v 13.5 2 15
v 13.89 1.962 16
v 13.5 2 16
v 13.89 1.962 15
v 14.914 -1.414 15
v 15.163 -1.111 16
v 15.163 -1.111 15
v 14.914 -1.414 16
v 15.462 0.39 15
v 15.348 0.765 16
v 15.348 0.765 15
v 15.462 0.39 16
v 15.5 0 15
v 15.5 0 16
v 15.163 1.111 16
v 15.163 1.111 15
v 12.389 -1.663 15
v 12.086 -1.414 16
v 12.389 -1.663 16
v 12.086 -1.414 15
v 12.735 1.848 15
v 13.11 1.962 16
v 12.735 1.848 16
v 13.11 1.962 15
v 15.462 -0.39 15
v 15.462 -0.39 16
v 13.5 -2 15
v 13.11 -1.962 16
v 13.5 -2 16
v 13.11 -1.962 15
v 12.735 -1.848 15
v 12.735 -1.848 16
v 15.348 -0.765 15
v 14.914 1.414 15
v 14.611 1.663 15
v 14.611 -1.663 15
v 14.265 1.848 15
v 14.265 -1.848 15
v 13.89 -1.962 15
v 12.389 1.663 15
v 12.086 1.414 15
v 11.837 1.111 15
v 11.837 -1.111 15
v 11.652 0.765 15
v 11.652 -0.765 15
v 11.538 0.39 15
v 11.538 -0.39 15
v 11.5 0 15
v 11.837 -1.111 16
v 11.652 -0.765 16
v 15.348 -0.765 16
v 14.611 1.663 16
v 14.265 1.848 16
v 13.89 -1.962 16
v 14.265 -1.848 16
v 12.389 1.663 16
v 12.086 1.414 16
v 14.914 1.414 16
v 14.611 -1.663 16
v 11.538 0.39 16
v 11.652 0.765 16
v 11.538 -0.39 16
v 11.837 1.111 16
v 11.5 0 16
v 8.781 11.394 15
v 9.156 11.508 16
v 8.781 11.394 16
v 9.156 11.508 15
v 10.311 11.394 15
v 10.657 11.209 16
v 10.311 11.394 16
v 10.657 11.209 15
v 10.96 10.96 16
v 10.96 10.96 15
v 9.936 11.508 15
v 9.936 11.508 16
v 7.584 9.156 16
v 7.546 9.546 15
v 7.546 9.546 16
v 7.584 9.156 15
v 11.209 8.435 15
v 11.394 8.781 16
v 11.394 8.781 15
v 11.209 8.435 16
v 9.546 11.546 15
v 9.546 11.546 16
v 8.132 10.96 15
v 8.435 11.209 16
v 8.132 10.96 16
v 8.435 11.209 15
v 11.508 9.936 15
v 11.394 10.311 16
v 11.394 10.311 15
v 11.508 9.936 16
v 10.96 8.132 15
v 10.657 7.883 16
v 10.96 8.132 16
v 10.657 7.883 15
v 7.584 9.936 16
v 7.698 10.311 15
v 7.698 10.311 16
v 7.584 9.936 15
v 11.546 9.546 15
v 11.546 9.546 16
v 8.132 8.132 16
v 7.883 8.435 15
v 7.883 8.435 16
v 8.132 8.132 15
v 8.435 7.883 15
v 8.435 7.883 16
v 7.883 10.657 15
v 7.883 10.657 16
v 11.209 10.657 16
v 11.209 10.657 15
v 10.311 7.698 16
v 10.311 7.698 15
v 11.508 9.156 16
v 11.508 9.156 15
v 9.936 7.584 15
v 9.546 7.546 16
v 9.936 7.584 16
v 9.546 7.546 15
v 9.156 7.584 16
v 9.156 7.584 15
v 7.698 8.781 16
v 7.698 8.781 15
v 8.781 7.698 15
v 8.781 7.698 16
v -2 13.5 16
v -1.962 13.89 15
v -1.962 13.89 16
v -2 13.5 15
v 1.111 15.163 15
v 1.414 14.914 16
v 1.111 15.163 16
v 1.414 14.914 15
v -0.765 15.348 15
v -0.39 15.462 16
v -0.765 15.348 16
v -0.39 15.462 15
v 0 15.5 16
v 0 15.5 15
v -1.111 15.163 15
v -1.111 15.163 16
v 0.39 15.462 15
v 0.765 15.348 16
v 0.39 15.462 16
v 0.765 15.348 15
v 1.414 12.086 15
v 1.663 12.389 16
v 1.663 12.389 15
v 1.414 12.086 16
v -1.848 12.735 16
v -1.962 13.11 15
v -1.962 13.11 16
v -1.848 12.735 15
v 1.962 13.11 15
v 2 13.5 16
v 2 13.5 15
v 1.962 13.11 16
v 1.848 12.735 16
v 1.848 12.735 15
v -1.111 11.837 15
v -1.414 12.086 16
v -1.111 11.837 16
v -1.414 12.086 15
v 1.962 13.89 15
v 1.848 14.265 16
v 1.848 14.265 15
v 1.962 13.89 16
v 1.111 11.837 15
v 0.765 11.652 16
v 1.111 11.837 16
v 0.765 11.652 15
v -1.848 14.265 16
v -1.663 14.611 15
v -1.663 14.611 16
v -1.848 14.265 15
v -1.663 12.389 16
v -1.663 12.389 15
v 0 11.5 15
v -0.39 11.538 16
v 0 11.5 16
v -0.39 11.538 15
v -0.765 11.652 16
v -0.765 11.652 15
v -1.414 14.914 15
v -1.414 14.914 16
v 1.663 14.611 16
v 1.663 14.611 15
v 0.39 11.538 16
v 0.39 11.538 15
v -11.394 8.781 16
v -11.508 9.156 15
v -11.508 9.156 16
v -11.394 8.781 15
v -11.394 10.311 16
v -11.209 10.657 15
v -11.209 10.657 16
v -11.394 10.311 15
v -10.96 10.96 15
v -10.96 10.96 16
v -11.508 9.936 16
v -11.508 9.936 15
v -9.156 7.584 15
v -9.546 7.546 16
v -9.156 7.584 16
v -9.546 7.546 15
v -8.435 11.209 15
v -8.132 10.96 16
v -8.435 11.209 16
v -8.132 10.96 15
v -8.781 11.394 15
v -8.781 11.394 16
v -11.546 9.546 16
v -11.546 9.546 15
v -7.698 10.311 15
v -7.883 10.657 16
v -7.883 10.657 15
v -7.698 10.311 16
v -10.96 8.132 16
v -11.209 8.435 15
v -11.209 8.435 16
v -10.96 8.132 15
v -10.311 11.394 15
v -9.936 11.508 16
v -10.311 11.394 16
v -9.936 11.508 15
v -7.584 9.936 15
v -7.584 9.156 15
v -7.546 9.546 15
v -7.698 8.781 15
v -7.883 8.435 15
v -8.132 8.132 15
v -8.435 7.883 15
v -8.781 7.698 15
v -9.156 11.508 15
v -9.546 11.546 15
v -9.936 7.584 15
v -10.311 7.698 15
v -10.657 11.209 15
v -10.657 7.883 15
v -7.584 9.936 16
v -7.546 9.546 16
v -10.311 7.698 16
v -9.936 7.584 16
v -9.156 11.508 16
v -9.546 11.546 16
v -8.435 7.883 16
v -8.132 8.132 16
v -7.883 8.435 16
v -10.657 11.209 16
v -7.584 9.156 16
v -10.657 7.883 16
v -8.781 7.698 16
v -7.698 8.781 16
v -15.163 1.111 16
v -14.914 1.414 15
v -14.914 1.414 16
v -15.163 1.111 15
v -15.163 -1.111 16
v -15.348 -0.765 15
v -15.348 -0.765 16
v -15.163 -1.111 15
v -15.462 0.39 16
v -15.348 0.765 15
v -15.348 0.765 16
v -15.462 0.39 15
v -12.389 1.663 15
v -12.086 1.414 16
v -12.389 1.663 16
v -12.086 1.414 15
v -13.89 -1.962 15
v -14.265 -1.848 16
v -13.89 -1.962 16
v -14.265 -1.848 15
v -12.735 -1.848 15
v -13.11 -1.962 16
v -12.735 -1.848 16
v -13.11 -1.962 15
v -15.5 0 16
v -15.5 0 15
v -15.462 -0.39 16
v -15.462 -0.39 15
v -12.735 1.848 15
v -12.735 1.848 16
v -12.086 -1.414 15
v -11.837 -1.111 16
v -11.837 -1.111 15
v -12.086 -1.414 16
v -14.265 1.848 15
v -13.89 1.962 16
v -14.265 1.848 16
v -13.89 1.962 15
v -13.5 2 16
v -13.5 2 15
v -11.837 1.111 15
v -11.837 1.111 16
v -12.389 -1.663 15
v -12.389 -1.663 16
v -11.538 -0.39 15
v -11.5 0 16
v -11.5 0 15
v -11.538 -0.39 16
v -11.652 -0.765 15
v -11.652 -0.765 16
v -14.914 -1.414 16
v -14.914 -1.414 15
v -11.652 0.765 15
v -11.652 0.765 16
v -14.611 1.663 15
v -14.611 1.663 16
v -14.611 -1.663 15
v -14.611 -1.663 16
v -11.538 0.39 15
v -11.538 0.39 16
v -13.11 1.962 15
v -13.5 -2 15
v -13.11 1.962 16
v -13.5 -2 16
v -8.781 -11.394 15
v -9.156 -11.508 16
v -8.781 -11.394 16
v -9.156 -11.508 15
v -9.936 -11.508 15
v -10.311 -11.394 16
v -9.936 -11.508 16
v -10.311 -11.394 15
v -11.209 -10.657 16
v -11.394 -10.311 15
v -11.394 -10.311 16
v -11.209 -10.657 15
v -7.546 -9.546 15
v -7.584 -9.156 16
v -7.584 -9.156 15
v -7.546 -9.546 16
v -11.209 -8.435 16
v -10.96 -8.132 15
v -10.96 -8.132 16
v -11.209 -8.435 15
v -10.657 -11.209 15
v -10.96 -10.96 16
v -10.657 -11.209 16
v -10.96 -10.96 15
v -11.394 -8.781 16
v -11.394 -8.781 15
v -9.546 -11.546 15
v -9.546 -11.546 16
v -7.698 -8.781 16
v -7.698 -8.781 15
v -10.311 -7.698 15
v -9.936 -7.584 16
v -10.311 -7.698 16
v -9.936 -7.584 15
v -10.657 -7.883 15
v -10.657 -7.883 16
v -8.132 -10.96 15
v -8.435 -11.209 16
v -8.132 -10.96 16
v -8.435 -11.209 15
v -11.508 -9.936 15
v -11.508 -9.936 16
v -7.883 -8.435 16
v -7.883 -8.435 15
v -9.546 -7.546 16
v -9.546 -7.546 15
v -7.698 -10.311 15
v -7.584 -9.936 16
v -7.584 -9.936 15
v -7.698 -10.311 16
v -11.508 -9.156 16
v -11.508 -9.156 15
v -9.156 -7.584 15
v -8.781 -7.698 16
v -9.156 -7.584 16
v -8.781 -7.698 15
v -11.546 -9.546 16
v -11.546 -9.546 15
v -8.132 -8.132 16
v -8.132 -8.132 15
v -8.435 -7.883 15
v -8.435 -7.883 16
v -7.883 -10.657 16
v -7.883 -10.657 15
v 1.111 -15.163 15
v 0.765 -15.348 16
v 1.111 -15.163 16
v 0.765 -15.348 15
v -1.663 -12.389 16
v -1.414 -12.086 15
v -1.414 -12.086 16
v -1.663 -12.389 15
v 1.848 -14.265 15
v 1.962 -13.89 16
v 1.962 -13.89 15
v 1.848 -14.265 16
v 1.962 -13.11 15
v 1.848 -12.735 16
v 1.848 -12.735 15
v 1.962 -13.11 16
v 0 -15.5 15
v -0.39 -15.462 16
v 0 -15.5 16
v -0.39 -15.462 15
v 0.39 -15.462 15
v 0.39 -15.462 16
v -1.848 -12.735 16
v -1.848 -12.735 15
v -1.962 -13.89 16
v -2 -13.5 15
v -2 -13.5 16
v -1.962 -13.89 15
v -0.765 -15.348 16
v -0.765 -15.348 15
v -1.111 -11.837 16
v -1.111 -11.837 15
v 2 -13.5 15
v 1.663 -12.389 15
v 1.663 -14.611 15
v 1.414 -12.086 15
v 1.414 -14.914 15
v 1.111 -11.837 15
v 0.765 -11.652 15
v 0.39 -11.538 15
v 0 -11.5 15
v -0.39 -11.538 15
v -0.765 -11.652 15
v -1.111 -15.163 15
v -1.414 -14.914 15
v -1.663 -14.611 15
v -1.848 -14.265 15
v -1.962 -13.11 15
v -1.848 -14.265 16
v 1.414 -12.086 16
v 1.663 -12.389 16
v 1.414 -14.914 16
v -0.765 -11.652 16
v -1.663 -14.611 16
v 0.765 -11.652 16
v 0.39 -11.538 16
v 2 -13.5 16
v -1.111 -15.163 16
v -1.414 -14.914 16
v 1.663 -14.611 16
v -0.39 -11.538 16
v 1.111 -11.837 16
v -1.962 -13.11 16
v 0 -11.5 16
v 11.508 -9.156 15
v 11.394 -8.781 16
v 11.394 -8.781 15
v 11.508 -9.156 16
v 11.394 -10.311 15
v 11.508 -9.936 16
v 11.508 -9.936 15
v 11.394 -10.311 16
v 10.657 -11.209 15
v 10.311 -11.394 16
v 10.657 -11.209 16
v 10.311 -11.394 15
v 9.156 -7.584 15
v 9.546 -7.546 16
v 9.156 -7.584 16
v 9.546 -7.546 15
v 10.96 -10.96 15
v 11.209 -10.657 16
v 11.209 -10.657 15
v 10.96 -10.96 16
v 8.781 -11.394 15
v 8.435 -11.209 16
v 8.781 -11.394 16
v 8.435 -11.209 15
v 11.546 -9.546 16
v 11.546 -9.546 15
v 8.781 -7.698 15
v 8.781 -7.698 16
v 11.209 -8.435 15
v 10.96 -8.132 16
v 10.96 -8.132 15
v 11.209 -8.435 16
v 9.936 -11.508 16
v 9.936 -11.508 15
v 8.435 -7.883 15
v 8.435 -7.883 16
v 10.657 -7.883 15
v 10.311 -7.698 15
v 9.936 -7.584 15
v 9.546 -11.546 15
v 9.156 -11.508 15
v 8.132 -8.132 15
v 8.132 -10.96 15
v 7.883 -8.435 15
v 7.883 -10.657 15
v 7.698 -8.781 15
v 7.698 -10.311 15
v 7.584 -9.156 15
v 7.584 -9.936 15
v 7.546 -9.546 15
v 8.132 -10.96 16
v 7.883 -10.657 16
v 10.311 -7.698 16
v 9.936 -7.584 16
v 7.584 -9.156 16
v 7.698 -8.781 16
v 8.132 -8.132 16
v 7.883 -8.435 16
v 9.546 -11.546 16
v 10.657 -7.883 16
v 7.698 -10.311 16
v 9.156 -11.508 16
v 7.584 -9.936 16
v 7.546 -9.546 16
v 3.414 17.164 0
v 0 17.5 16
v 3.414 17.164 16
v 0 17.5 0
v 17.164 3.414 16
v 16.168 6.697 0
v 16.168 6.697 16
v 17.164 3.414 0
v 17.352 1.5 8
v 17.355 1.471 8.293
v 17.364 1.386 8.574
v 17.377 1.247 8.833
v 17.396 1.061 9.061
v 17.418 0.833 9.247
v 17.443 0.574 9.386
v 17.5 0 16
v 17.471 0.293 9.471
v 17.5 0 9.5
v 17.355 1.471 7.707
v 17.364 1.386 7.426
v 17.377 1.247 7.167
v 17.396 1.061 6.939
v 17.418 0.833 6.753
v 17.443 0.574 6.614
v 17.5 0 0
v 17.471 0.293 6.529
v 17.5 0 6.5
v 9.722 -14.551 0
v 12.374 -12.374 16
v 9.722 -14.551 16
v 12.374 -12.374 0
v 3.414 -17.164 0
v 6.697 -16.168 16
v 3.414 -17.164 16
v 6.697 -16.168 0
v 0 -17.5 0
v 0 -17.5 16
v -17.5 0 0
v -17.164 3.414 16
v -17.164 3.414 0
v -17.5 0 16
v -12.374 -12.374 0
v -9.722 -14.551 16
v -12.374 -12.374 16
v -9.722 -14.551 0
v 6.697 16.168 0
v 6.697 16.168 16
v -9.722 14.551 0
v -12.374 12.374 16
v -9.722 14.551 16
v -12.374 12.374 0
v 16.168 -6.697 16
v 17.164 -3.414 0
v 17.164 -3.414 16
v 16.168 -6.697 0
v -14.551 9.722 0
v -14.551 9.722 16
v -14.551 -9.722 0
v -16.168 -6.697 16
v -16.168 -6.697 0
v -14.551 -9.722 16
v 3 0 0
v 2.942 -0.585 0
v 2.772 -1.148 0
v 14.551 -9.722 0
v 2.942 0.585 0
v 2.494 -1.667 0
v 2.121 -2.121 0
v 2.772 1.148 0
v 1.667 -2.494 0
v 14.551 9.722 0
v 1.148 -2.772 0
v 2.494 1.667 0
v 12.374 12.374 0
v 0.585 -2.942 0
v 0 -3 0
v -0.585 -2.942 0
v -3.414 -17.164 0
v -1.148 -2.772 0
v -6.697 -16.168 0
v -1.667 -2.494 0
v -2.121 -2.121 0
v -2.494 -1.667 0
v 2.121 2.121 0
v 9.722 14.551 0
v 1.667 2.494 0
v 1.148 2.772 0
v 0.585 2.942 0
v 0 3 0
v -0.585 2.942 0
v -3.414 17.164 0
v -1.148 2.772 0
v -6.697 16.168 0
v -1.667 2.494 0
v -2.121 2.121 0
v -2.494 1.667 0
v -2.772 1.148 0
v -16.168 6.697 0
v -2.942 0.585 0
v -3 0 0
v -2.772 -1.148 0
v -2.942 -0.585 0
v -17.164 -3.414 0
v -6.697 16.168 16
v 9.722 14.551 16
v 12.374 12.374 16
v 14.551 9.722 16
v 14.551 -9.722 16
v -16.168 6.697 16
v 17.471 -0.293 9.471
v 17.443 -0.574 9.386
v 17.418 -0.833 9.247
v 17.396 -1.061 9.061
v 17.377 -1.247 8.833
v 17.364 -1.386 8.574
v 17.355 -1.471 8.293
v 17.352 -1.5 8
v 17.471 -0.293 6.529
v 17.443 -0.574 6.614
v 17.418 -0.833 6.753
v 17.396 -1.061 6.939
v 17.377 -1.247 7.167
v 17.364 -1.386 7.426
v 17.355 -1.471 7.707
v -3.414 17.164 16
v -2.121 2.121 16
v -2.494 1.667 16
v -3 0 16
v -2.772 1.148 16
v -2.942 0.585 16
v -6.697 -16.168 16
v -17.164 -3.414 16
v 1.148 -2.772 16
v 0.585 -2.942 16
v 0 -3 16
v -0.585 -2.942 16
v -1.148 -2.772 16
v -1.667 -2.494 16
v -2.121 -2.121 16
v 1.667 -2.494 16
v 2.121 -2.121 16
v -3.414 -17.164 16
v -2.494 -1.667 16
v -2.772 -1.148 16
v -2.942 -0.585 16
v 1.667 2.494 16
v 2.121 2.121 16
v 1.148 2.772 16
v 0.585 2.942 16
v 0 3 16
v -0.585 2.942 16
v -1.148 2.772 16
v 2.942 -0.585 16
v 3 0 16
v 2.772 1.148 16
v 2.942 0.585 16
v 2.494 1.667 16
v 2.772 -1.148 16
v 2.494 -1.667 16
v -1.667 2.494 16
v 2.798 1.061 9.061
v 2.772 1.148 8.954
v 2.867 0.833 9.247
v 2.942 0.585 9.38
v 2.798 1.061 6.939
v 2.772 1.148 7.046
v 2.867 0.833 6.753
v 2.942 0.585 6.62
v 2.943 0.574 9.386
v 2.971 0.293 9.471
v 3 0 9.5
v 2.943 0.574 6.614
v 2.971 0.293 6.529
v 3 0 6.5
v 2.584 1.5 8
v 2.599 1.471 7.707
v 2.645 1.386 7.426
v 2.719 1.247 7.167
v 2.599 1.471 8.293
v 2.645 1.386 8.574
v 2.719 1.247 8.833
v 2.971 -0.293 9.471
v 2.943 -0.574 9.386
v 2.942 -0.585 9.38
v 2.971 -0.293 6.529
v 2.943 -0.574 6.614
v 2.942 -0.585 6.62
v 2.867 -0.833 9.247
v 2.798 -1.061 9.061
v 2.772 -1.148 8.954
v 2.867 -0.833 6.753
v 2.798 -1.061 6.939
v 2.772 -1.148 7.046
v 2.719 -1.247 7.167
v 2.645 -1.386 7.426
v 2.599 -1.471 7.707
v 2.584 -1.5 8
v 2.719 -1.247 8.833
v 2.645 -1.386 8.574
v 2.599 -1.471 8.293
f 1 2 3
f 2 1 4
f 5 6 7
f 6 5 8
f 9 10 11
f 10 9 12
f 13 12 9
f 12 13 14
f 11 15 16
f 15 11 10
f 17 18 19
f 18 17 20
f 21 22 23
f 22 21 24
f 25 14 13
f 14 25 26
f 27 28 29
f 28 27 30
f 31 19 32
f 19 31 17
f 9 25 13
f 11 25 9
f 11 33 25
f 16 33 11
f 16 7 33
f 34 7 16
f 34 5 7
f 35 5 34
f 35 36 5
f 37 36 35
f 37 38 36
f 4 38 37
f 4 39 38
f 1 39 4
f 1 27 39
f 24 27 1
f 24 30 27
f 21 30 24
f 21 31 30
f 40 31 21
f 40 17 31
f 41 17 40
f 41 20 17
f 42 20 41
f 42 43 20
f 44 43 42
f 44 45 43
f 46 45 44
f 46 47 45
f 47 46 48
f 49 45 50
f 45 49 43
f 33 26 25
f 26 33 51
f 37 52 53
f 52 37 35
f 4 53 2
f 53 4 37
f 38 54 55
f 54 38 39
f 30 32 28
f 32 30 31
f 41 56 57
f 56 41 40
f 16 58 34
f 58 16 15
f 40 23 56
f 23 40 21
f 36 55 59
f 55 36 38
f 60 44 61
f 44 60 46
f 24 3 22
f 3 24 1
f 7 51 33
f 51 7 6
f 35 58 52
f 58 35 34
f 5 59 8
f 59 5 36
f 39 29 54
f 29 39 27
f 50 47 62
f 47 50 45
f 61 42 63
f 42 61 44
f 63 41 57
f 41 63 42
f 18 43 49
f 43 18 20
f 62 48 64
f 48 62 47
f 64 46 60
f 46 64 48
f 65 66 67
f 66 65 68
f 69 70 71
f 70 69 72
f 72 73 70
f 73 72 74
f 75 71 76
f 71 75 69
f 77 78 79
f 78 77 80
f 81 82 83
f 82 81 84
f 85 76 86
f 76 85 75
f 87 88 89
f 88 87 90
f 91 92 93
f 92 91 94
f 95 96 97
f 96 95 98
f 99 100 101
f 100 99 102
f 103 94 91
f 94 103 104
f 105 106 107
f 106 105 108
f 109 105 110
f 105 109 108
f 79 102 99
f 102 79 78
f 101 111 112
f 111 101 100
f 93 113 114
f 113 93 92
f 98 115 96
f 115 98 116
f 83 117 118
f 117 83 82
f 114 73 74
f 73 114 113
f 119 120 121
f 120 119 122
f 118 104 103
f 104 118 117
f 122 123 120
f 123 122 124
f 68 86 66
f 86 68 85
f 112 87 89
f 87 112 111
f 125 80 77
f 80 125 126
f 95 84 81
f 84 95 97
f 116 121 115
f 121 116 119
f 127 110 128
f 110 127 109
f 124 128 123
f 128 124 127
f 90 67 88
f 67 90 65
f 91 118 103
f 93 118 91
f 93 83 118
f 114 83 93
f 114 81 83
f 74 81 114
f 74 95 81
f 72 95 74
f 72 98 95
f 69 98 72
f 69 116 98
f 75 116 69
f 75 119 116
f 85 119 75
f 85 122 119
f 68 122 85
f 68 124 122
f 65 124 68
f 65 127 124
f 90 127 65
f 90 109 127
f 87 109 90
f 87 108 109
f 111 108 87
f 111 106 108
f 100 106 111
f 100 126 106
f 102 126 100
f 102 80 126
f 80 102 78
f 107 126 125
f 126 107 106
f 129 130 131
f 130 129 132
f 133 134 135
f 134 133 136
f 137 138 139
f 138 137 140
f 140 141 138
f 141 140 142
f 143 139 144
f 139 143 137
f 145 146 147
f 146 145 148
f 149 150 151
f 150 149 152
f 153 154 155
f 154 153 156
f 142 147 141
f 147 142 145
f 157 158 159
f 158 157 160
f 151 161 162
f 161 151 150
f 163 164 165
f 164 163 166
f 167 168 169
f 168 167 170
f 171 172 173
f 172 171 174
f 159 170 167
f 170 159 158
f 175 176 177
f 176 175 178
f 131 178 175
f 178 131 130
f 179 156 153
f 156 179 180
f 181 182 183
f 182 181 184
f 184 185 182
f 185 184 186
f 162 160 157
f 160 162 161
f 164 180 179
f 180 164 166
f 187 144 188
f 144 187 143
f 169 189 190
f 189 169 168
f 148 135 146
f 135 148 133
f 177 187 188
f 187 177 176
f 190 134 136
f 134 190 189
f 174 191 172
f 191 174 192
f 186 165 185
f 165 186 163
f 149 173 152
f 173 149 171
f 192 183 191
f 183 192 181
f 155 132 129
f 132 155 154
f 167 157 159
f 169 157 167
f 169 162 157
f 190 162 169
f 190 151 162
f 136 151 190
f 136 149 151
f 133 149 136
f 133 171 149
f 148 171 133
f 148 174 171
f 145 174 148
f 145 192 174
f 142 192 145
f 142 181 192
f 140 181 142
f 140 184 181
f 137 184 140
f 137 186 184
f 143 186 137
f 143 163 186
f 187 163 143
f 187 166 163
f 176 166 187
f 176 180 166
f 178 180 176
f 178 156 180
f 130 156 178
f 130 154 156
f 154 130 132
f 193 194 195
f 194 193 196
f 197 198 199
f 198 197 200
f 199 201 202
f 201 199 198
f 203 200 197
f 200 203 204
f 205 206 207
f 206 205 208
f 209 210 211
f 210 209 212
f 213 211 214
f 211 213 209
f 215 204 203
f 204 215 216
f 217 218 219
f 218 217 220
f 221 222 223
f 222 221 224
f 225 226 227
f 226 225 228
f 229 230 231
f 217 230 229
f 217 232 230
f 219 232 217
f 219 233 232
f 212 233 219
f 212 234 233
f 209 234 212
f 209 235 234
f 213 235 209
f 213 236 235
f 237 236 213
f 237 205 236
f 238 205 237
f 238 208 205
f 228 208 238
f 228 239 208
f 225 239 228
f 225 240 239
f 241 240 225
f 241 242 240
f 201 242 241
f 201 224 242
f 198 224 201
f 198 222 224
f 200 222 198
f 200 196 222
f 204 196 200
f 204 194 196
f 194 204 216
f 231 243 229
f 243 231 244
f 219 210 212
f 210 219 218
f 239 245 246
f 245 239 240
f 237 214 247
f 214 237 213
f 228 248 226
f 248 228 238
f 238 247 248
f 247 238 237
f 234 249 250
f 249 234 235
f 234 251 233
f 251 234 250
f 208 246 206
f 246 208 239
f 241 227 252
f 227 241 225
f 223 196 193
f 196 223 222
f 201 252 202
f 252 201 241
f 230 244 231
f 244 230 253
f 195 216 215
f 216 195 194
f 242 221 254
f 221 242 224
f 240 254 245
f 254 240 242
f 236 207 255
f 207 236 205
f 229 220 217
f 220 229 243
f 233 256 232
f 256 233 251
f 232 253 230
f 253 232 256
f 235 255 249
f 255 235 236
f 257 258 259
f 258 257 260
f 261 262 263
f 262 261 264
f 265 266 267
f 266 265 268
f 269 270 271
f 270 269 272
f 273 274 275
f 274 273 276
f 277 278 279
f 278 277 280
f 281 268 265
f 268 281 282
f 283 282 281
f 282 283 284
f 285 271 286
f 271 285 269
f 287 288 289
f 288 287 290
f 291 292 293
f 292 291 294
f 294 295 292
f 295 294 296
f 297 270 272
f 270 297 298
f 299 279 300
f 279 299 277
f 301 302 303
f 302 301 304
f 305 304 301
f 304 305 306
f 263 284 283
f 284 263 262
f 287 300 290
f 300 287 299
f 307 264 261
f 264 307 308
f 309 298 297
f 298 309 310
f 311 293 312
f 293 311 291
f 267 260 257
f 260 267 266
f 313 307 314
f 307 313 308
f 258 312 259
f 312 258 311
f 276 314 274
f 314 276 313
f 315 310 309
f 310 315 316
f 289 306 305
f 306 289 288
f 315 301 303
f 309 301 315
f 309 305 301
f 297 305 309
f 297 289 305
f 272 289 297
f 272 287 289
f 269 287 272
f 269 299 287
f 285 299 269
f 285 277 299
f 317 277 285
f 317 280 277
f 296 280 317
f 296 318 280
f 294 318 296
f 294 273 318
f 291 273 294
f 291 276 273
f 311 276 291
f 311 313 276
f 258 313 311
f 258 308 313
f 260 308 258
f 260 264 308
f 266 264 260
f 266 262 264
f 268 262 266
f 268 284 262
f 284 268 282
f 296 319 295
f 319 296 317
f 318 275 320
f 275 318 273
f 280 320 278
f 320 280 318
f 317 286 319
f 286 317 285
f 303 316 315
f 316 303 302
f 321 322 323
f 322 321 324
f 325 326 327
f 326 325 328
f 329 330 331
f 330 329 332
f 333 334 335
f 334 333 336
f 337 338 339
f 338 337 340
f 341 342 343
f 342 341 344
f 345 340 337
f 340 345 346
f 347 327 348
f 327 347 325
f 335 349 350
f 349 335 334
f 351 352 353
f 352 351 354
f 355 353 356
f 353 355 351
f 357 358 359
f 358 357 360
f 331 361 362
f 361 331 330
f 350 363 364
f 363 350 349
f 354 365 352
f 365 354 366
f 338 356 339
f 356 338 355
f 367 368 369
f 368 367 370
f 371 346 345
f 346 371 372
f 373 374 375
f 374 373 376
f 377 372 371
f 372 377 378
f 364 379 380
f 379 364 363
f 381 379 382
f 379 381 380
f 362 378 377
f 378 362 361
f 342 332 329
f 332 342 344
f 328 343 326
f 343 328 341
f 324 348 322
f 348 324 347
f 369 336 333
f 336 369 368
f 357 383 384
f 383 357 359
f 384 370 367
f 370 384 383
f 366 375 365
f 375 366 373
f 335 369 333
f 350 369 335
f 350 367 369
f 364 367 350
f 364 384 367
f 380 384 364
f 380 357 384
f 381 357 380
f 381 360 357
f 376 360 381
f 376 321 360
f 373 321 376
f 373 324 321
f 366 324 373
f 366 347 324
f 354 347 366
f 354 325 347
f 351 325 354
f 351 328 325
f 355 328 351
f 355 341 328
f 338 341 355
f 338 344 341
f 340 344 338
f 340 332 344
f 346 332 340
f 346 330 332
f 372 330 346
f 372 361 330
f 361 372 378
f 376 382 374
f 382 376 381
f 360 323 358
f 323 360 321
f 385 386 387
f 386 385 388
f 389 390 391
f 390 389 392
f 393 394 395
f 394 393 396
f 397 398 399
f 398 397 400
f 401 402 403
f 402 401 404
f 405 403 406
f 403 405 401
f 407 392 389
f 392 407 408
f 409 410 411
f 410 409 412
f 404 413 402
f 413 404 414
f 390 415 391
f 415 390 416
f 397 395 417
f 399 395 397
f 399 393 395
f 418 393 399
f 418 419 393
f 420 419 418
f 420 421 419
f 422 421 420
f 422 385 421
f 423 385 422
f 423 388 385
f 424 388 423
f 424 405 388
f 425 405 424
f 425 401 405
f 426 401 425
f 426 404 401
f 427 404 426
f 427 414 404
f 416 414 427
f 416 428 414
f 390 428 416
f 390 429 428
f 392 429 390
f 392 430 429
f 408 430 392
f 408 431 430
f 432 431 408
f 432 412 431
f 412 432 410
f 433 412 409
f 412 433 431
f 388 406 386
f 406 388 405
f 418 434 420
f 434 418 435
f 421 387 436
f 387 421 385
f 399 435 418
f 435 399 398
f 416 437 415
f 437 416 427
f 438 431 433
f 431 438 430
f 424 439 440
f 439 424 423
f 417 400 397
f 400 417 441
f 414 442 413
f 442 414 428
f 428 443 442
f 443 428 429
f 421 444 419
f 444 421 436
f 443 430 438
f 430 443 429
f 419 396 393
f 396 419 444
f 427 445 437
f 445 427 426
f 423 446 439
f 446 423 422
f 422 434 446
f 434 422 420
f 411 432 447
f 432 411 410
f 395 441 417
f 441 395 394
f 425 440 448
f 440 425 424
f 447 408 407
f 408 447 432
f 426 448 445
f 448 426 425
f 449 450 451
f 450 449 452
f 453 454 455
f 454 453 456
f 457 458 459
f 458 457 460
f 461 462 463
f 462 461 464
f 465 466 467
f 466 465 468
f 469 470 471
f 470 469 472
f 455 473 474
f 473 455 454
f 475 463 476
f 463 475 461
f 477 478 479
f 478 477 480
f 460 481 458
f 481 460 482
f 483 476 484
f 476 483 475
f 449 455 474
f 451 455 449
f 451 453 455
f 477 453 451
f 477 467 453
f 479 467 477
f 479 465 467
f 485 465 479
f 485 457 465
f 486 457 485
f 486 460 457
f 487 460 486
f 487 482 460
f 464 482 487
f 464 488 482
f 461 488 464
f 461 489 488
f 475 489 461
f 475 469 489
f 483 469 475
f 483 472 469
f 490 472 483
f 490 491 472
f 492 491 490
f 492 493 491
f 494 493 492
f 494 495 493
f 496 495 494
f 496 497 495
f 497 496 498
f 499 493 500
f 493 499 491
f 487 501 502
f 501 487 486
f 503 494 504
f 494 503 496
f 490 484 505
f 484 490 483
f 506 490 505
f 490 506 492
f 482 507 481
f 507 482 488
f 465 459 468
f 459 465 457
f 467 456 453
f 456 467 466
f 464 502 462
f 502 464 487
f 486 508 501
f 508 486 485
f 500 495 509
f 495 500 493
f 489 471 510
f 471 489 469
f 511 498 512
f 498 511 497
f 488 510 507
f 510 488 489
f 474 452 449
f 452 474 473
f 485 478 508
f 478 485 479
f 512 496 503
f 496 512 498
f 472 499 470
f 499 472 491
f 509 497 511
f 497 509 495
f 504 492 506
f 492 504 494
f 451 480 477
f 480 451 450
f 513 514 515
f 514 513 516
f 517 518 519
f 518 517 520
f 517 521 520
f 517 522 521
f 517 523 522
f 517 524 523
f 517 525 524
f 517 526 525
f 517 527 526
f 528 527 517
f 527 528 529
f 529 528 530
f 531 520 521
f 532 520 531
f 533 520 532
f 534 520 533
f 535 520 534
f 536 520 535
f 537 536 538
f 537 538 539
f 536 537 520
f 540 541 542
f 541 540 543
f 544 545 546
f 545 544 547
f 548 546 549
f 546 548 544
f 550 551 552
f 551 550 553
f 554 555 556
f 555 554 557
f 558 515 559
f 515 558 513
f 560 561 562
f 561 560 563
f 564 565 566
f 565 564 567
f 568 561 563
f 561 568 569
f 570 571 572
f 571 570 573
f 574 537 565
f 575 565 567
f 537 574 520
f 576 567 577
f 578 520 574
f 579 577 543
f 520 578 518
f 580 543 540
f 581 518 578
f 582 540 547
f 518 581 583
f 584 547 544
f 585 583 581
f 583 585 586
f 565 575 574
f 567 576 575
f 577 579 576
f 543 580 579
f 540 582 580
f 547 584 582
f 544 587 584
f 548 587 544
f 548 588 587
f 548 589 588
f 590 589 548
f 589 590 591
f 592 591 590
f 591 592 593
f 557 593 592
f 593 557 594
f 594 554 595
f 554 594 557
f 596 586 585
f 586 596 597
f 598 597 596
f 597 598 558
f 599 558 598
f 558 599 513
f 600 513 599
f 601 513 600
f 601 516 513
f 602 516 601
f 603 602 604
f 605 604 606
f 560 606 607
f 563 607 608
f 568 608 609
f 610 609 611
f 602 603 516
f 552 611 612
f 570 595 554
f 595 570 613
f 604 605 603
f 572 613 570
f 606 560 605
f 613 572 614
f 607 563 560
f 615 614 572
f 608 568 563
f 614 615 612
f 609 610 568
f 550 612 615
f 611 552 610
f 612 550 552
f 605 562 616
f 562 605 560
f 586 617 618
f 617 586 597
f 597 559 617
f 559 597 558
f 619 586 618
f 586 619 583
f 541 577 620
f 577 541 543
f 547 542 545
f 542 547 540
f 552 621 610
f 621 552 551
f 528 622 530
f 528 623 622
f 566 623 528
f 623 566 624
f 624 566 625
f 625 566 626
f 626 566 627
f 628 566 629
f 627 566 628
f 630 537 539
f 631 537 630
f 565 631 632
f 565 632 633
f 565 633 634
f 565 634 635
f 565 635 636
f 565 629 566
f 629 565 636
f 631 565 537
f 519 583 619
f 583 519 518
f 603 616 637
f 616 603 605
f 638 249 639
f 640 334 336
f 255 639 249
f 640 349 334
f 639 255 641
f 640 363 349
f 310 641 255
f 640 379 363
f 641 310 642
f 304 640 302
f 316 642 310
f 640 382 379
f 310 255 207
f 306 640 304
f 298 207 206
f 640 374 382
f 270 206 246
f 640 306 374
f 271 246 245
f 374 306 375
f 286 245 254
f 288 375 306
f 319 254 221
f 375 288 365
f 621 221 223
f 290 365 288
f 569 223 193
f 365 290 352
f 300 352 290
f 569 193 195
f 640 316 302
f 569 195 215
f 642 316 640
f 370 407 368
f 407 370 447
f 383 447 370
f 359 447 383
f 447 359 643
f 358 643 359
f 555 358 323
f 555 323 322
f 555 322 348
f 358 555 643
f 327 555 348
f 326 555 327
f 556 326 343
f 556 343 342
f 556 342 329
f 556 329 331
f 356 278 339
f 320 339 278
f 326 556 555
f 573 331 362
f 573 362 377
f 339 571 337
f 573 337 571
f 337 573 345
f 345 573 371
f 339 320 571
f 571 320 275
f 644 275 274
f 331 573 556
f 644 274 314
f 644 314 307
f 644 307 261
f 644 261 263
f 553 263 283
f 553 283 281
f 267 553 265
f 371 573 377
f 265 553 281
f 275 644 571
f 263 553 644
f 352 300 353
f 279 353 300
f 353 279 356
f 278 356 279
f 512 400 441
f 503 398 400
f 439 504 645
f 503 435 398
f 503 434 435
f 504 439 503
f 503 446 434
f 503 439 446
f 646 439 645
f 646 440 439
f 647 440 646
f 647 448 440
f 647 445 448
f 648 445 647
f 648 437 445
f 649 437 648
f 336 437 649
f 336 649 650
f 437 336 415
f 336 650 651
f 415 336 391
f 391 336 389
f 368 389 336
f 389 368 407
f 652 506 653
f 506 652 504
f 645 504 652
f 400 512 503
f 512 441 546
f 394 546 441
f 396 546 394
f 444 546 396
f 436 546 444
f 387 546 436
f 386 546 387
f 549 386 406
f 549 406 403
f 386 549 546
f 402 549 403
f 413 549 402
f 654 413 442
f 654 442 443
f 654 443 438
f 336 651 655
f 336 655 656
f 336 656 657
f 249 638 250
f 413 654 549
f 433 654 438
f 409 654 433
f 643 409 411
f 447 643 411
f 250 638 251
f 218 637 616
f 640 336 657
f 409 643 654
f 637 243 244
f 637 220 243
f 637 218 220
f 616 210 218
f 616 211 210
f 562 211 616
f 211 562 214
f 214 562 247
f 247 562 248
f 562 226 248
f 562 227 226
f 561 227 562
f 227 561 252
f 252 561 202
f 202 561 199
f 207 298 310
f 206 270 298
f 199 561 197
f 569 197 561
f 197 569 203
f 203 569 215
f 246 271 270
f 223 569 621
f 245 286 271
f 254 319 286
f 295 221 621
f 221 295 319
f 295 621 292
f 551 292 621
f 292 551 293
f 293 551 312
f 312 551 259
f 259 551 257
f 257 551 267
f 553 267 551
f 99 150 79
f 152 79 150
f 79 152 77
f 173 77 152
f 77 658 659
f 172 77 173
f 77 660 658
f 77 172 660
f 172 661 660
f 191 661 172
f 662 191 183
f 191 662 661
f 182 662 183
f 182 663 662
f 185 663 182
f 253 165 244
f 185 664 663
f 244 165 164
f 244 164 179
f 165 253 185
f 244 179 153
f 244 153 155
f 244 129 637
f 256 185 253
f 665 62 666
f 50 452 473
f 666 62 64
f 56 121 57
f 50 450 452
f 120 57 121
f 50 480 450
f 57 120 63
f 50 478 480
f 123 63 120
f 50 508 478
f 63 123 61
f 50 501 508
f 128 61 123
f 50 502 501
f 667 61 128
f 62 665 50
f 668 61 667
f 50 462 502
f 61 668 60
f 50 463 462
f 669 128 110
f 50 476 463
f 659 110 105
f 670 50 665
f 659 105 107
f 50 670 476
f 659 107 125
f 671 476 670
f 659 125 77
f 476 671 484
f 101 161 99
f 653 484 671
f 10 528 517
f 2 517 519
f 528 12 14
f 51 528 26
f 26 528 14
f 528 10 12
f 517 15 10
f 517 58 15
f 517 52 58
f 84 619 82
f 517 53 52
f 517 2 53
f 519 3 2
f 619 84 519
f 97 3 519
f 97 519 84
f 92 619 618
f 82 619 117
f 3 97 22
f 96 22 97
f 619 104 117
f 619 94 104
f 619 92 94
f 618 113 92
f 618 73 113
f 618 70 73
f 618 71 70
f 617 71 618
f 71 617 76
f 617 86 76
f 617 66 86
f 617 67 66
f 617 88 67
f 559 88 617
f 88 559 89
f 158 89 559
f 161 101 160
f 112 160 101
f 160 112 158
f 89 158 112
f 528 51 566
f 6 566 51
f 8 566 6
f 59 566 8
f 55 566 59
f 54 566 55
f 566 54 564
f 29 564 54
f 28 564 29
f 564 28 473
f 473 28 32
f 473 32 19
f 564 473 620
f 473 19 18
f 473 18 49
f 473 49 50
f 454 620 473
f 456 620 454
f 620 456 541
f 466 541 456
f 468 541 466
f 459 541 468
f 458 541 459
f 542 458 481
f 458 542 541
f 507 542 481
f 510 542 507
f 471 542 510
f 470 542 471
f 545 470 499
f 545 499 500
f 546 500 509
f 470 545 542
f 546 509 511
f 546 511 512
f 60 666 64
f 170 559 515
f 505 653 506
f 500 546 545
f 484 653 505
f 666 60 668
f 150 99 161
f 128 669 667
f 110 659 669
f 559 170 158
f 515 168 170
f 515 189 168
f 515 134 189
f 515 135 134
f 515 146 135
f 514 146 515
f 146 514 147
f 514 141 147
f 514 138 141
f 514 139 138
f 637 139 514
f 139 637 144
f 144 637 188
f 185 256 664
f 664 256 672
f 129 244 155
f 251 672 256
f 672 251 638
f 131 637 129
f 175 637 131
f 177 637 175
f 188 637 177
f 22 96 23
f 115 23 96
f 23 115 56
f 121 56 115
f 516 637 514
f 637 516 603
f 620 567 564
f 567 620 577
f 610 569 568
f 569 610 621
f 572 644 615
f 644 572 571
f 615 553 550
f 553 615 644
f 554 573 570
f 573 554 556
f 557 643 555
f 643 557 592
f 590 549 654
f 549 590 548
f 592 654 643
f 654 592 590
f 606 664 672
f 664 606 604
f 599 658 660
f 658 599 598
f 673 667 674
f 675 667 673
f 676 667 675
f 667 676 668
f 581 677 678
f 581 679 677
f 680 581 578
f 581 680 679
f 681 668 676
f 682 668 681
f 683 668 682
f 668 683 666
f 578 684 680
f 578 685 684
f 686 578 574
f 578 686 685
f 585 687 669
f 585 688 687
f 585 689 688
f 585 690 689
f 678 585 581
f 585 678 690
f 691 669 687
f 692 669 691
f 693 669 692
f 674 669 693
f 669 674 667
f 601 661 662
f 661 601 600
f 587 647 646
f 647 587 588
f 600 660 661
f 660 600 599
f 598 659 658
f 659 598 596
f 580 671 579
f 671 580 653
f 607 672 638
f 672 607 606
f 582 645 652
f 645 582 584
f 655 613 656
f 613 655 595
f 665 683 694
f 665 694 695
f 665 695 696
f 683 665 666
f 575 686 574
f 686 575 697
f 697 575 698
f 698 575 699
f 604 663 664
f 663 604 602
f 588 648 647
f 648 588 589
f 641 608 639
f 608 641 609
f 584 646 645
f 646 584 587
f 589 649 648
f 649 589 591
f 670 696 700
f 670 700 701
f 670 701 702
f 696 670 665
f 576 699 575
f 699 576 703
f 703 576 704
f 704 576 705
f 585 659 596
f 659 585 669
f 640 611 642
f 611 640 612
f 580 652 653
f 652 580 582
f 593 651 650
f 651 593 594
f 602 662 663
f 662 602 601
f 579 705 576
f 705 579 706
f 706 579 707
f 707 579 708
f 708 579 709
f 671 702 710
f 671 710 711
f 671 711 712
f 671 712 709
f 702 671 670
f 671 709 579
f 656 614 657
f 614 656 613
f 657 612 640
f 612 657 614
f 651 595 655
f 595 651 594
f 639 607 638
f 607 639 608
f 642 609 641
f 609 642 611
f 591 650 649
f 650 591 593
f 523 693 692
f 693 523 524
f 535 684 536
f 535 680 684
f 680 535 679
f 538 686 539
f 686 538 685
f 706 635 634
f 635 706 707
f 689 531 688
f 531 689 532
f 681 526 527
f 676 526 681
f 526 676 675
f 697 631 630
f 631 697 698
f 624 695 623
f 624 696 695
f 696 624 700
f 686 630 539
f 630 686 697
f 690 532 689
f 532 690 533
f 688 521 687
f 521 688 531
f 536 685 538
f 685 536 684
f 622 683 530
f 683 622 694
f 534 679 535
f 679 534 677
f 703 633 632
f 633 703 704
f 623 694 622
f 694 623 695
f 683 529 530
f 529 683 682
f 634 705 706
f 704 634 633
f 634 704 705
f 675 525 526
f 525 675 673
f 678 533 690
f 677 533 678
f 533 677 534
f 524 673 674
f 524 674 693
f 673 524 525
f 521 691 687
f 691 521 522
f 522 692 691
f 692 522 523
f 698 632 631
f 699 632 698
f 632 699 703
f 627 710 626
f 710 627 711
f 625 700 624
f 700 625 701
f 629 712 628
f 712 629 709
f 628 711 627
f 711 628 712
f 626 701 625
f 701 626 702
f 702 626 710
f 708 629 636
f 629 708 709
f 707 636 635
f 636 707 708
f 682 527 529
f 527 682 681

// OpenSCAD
$fn = 32;

// ----------------------------------------------------------------------
// Control knob: dimpled knob
// ----------------------------------------------------------------------

// --- parameters (mm) ---
dimp_d = 4;               // finger dimple diameter
n_dimp = 8;               // number of dimples
dimp_r = 13.5;            // dimple ring radius
knob_d = 35;              // knob body diameter
knob_h = 16;              // knob body height
bore_d = 6;               // shaft bore diameter
set_d = 3;                // set screw bore diameter

dimp_step = 360 / n_dimp;  // dimple angular step

difference() {
  cylinder(h = knob_h, d = knob_d);
  translate([0, 0, -1]) cylinder(h = knob_h + 2, d = bore_d);
  translate([-1, 0, knob_h / 2]) rotate([0, 90, 0])
    cylinder(h = knob_d / 2 + bore_d / 2 + 2, d = set_d);  for (i = [0 : n_dimp - 1])
    rotate([0, 0, i * dimp_step])
      translate([dimp_r, 0, knob_h - 1])
        cylinder(h = 2, d = dimp_d);
}
